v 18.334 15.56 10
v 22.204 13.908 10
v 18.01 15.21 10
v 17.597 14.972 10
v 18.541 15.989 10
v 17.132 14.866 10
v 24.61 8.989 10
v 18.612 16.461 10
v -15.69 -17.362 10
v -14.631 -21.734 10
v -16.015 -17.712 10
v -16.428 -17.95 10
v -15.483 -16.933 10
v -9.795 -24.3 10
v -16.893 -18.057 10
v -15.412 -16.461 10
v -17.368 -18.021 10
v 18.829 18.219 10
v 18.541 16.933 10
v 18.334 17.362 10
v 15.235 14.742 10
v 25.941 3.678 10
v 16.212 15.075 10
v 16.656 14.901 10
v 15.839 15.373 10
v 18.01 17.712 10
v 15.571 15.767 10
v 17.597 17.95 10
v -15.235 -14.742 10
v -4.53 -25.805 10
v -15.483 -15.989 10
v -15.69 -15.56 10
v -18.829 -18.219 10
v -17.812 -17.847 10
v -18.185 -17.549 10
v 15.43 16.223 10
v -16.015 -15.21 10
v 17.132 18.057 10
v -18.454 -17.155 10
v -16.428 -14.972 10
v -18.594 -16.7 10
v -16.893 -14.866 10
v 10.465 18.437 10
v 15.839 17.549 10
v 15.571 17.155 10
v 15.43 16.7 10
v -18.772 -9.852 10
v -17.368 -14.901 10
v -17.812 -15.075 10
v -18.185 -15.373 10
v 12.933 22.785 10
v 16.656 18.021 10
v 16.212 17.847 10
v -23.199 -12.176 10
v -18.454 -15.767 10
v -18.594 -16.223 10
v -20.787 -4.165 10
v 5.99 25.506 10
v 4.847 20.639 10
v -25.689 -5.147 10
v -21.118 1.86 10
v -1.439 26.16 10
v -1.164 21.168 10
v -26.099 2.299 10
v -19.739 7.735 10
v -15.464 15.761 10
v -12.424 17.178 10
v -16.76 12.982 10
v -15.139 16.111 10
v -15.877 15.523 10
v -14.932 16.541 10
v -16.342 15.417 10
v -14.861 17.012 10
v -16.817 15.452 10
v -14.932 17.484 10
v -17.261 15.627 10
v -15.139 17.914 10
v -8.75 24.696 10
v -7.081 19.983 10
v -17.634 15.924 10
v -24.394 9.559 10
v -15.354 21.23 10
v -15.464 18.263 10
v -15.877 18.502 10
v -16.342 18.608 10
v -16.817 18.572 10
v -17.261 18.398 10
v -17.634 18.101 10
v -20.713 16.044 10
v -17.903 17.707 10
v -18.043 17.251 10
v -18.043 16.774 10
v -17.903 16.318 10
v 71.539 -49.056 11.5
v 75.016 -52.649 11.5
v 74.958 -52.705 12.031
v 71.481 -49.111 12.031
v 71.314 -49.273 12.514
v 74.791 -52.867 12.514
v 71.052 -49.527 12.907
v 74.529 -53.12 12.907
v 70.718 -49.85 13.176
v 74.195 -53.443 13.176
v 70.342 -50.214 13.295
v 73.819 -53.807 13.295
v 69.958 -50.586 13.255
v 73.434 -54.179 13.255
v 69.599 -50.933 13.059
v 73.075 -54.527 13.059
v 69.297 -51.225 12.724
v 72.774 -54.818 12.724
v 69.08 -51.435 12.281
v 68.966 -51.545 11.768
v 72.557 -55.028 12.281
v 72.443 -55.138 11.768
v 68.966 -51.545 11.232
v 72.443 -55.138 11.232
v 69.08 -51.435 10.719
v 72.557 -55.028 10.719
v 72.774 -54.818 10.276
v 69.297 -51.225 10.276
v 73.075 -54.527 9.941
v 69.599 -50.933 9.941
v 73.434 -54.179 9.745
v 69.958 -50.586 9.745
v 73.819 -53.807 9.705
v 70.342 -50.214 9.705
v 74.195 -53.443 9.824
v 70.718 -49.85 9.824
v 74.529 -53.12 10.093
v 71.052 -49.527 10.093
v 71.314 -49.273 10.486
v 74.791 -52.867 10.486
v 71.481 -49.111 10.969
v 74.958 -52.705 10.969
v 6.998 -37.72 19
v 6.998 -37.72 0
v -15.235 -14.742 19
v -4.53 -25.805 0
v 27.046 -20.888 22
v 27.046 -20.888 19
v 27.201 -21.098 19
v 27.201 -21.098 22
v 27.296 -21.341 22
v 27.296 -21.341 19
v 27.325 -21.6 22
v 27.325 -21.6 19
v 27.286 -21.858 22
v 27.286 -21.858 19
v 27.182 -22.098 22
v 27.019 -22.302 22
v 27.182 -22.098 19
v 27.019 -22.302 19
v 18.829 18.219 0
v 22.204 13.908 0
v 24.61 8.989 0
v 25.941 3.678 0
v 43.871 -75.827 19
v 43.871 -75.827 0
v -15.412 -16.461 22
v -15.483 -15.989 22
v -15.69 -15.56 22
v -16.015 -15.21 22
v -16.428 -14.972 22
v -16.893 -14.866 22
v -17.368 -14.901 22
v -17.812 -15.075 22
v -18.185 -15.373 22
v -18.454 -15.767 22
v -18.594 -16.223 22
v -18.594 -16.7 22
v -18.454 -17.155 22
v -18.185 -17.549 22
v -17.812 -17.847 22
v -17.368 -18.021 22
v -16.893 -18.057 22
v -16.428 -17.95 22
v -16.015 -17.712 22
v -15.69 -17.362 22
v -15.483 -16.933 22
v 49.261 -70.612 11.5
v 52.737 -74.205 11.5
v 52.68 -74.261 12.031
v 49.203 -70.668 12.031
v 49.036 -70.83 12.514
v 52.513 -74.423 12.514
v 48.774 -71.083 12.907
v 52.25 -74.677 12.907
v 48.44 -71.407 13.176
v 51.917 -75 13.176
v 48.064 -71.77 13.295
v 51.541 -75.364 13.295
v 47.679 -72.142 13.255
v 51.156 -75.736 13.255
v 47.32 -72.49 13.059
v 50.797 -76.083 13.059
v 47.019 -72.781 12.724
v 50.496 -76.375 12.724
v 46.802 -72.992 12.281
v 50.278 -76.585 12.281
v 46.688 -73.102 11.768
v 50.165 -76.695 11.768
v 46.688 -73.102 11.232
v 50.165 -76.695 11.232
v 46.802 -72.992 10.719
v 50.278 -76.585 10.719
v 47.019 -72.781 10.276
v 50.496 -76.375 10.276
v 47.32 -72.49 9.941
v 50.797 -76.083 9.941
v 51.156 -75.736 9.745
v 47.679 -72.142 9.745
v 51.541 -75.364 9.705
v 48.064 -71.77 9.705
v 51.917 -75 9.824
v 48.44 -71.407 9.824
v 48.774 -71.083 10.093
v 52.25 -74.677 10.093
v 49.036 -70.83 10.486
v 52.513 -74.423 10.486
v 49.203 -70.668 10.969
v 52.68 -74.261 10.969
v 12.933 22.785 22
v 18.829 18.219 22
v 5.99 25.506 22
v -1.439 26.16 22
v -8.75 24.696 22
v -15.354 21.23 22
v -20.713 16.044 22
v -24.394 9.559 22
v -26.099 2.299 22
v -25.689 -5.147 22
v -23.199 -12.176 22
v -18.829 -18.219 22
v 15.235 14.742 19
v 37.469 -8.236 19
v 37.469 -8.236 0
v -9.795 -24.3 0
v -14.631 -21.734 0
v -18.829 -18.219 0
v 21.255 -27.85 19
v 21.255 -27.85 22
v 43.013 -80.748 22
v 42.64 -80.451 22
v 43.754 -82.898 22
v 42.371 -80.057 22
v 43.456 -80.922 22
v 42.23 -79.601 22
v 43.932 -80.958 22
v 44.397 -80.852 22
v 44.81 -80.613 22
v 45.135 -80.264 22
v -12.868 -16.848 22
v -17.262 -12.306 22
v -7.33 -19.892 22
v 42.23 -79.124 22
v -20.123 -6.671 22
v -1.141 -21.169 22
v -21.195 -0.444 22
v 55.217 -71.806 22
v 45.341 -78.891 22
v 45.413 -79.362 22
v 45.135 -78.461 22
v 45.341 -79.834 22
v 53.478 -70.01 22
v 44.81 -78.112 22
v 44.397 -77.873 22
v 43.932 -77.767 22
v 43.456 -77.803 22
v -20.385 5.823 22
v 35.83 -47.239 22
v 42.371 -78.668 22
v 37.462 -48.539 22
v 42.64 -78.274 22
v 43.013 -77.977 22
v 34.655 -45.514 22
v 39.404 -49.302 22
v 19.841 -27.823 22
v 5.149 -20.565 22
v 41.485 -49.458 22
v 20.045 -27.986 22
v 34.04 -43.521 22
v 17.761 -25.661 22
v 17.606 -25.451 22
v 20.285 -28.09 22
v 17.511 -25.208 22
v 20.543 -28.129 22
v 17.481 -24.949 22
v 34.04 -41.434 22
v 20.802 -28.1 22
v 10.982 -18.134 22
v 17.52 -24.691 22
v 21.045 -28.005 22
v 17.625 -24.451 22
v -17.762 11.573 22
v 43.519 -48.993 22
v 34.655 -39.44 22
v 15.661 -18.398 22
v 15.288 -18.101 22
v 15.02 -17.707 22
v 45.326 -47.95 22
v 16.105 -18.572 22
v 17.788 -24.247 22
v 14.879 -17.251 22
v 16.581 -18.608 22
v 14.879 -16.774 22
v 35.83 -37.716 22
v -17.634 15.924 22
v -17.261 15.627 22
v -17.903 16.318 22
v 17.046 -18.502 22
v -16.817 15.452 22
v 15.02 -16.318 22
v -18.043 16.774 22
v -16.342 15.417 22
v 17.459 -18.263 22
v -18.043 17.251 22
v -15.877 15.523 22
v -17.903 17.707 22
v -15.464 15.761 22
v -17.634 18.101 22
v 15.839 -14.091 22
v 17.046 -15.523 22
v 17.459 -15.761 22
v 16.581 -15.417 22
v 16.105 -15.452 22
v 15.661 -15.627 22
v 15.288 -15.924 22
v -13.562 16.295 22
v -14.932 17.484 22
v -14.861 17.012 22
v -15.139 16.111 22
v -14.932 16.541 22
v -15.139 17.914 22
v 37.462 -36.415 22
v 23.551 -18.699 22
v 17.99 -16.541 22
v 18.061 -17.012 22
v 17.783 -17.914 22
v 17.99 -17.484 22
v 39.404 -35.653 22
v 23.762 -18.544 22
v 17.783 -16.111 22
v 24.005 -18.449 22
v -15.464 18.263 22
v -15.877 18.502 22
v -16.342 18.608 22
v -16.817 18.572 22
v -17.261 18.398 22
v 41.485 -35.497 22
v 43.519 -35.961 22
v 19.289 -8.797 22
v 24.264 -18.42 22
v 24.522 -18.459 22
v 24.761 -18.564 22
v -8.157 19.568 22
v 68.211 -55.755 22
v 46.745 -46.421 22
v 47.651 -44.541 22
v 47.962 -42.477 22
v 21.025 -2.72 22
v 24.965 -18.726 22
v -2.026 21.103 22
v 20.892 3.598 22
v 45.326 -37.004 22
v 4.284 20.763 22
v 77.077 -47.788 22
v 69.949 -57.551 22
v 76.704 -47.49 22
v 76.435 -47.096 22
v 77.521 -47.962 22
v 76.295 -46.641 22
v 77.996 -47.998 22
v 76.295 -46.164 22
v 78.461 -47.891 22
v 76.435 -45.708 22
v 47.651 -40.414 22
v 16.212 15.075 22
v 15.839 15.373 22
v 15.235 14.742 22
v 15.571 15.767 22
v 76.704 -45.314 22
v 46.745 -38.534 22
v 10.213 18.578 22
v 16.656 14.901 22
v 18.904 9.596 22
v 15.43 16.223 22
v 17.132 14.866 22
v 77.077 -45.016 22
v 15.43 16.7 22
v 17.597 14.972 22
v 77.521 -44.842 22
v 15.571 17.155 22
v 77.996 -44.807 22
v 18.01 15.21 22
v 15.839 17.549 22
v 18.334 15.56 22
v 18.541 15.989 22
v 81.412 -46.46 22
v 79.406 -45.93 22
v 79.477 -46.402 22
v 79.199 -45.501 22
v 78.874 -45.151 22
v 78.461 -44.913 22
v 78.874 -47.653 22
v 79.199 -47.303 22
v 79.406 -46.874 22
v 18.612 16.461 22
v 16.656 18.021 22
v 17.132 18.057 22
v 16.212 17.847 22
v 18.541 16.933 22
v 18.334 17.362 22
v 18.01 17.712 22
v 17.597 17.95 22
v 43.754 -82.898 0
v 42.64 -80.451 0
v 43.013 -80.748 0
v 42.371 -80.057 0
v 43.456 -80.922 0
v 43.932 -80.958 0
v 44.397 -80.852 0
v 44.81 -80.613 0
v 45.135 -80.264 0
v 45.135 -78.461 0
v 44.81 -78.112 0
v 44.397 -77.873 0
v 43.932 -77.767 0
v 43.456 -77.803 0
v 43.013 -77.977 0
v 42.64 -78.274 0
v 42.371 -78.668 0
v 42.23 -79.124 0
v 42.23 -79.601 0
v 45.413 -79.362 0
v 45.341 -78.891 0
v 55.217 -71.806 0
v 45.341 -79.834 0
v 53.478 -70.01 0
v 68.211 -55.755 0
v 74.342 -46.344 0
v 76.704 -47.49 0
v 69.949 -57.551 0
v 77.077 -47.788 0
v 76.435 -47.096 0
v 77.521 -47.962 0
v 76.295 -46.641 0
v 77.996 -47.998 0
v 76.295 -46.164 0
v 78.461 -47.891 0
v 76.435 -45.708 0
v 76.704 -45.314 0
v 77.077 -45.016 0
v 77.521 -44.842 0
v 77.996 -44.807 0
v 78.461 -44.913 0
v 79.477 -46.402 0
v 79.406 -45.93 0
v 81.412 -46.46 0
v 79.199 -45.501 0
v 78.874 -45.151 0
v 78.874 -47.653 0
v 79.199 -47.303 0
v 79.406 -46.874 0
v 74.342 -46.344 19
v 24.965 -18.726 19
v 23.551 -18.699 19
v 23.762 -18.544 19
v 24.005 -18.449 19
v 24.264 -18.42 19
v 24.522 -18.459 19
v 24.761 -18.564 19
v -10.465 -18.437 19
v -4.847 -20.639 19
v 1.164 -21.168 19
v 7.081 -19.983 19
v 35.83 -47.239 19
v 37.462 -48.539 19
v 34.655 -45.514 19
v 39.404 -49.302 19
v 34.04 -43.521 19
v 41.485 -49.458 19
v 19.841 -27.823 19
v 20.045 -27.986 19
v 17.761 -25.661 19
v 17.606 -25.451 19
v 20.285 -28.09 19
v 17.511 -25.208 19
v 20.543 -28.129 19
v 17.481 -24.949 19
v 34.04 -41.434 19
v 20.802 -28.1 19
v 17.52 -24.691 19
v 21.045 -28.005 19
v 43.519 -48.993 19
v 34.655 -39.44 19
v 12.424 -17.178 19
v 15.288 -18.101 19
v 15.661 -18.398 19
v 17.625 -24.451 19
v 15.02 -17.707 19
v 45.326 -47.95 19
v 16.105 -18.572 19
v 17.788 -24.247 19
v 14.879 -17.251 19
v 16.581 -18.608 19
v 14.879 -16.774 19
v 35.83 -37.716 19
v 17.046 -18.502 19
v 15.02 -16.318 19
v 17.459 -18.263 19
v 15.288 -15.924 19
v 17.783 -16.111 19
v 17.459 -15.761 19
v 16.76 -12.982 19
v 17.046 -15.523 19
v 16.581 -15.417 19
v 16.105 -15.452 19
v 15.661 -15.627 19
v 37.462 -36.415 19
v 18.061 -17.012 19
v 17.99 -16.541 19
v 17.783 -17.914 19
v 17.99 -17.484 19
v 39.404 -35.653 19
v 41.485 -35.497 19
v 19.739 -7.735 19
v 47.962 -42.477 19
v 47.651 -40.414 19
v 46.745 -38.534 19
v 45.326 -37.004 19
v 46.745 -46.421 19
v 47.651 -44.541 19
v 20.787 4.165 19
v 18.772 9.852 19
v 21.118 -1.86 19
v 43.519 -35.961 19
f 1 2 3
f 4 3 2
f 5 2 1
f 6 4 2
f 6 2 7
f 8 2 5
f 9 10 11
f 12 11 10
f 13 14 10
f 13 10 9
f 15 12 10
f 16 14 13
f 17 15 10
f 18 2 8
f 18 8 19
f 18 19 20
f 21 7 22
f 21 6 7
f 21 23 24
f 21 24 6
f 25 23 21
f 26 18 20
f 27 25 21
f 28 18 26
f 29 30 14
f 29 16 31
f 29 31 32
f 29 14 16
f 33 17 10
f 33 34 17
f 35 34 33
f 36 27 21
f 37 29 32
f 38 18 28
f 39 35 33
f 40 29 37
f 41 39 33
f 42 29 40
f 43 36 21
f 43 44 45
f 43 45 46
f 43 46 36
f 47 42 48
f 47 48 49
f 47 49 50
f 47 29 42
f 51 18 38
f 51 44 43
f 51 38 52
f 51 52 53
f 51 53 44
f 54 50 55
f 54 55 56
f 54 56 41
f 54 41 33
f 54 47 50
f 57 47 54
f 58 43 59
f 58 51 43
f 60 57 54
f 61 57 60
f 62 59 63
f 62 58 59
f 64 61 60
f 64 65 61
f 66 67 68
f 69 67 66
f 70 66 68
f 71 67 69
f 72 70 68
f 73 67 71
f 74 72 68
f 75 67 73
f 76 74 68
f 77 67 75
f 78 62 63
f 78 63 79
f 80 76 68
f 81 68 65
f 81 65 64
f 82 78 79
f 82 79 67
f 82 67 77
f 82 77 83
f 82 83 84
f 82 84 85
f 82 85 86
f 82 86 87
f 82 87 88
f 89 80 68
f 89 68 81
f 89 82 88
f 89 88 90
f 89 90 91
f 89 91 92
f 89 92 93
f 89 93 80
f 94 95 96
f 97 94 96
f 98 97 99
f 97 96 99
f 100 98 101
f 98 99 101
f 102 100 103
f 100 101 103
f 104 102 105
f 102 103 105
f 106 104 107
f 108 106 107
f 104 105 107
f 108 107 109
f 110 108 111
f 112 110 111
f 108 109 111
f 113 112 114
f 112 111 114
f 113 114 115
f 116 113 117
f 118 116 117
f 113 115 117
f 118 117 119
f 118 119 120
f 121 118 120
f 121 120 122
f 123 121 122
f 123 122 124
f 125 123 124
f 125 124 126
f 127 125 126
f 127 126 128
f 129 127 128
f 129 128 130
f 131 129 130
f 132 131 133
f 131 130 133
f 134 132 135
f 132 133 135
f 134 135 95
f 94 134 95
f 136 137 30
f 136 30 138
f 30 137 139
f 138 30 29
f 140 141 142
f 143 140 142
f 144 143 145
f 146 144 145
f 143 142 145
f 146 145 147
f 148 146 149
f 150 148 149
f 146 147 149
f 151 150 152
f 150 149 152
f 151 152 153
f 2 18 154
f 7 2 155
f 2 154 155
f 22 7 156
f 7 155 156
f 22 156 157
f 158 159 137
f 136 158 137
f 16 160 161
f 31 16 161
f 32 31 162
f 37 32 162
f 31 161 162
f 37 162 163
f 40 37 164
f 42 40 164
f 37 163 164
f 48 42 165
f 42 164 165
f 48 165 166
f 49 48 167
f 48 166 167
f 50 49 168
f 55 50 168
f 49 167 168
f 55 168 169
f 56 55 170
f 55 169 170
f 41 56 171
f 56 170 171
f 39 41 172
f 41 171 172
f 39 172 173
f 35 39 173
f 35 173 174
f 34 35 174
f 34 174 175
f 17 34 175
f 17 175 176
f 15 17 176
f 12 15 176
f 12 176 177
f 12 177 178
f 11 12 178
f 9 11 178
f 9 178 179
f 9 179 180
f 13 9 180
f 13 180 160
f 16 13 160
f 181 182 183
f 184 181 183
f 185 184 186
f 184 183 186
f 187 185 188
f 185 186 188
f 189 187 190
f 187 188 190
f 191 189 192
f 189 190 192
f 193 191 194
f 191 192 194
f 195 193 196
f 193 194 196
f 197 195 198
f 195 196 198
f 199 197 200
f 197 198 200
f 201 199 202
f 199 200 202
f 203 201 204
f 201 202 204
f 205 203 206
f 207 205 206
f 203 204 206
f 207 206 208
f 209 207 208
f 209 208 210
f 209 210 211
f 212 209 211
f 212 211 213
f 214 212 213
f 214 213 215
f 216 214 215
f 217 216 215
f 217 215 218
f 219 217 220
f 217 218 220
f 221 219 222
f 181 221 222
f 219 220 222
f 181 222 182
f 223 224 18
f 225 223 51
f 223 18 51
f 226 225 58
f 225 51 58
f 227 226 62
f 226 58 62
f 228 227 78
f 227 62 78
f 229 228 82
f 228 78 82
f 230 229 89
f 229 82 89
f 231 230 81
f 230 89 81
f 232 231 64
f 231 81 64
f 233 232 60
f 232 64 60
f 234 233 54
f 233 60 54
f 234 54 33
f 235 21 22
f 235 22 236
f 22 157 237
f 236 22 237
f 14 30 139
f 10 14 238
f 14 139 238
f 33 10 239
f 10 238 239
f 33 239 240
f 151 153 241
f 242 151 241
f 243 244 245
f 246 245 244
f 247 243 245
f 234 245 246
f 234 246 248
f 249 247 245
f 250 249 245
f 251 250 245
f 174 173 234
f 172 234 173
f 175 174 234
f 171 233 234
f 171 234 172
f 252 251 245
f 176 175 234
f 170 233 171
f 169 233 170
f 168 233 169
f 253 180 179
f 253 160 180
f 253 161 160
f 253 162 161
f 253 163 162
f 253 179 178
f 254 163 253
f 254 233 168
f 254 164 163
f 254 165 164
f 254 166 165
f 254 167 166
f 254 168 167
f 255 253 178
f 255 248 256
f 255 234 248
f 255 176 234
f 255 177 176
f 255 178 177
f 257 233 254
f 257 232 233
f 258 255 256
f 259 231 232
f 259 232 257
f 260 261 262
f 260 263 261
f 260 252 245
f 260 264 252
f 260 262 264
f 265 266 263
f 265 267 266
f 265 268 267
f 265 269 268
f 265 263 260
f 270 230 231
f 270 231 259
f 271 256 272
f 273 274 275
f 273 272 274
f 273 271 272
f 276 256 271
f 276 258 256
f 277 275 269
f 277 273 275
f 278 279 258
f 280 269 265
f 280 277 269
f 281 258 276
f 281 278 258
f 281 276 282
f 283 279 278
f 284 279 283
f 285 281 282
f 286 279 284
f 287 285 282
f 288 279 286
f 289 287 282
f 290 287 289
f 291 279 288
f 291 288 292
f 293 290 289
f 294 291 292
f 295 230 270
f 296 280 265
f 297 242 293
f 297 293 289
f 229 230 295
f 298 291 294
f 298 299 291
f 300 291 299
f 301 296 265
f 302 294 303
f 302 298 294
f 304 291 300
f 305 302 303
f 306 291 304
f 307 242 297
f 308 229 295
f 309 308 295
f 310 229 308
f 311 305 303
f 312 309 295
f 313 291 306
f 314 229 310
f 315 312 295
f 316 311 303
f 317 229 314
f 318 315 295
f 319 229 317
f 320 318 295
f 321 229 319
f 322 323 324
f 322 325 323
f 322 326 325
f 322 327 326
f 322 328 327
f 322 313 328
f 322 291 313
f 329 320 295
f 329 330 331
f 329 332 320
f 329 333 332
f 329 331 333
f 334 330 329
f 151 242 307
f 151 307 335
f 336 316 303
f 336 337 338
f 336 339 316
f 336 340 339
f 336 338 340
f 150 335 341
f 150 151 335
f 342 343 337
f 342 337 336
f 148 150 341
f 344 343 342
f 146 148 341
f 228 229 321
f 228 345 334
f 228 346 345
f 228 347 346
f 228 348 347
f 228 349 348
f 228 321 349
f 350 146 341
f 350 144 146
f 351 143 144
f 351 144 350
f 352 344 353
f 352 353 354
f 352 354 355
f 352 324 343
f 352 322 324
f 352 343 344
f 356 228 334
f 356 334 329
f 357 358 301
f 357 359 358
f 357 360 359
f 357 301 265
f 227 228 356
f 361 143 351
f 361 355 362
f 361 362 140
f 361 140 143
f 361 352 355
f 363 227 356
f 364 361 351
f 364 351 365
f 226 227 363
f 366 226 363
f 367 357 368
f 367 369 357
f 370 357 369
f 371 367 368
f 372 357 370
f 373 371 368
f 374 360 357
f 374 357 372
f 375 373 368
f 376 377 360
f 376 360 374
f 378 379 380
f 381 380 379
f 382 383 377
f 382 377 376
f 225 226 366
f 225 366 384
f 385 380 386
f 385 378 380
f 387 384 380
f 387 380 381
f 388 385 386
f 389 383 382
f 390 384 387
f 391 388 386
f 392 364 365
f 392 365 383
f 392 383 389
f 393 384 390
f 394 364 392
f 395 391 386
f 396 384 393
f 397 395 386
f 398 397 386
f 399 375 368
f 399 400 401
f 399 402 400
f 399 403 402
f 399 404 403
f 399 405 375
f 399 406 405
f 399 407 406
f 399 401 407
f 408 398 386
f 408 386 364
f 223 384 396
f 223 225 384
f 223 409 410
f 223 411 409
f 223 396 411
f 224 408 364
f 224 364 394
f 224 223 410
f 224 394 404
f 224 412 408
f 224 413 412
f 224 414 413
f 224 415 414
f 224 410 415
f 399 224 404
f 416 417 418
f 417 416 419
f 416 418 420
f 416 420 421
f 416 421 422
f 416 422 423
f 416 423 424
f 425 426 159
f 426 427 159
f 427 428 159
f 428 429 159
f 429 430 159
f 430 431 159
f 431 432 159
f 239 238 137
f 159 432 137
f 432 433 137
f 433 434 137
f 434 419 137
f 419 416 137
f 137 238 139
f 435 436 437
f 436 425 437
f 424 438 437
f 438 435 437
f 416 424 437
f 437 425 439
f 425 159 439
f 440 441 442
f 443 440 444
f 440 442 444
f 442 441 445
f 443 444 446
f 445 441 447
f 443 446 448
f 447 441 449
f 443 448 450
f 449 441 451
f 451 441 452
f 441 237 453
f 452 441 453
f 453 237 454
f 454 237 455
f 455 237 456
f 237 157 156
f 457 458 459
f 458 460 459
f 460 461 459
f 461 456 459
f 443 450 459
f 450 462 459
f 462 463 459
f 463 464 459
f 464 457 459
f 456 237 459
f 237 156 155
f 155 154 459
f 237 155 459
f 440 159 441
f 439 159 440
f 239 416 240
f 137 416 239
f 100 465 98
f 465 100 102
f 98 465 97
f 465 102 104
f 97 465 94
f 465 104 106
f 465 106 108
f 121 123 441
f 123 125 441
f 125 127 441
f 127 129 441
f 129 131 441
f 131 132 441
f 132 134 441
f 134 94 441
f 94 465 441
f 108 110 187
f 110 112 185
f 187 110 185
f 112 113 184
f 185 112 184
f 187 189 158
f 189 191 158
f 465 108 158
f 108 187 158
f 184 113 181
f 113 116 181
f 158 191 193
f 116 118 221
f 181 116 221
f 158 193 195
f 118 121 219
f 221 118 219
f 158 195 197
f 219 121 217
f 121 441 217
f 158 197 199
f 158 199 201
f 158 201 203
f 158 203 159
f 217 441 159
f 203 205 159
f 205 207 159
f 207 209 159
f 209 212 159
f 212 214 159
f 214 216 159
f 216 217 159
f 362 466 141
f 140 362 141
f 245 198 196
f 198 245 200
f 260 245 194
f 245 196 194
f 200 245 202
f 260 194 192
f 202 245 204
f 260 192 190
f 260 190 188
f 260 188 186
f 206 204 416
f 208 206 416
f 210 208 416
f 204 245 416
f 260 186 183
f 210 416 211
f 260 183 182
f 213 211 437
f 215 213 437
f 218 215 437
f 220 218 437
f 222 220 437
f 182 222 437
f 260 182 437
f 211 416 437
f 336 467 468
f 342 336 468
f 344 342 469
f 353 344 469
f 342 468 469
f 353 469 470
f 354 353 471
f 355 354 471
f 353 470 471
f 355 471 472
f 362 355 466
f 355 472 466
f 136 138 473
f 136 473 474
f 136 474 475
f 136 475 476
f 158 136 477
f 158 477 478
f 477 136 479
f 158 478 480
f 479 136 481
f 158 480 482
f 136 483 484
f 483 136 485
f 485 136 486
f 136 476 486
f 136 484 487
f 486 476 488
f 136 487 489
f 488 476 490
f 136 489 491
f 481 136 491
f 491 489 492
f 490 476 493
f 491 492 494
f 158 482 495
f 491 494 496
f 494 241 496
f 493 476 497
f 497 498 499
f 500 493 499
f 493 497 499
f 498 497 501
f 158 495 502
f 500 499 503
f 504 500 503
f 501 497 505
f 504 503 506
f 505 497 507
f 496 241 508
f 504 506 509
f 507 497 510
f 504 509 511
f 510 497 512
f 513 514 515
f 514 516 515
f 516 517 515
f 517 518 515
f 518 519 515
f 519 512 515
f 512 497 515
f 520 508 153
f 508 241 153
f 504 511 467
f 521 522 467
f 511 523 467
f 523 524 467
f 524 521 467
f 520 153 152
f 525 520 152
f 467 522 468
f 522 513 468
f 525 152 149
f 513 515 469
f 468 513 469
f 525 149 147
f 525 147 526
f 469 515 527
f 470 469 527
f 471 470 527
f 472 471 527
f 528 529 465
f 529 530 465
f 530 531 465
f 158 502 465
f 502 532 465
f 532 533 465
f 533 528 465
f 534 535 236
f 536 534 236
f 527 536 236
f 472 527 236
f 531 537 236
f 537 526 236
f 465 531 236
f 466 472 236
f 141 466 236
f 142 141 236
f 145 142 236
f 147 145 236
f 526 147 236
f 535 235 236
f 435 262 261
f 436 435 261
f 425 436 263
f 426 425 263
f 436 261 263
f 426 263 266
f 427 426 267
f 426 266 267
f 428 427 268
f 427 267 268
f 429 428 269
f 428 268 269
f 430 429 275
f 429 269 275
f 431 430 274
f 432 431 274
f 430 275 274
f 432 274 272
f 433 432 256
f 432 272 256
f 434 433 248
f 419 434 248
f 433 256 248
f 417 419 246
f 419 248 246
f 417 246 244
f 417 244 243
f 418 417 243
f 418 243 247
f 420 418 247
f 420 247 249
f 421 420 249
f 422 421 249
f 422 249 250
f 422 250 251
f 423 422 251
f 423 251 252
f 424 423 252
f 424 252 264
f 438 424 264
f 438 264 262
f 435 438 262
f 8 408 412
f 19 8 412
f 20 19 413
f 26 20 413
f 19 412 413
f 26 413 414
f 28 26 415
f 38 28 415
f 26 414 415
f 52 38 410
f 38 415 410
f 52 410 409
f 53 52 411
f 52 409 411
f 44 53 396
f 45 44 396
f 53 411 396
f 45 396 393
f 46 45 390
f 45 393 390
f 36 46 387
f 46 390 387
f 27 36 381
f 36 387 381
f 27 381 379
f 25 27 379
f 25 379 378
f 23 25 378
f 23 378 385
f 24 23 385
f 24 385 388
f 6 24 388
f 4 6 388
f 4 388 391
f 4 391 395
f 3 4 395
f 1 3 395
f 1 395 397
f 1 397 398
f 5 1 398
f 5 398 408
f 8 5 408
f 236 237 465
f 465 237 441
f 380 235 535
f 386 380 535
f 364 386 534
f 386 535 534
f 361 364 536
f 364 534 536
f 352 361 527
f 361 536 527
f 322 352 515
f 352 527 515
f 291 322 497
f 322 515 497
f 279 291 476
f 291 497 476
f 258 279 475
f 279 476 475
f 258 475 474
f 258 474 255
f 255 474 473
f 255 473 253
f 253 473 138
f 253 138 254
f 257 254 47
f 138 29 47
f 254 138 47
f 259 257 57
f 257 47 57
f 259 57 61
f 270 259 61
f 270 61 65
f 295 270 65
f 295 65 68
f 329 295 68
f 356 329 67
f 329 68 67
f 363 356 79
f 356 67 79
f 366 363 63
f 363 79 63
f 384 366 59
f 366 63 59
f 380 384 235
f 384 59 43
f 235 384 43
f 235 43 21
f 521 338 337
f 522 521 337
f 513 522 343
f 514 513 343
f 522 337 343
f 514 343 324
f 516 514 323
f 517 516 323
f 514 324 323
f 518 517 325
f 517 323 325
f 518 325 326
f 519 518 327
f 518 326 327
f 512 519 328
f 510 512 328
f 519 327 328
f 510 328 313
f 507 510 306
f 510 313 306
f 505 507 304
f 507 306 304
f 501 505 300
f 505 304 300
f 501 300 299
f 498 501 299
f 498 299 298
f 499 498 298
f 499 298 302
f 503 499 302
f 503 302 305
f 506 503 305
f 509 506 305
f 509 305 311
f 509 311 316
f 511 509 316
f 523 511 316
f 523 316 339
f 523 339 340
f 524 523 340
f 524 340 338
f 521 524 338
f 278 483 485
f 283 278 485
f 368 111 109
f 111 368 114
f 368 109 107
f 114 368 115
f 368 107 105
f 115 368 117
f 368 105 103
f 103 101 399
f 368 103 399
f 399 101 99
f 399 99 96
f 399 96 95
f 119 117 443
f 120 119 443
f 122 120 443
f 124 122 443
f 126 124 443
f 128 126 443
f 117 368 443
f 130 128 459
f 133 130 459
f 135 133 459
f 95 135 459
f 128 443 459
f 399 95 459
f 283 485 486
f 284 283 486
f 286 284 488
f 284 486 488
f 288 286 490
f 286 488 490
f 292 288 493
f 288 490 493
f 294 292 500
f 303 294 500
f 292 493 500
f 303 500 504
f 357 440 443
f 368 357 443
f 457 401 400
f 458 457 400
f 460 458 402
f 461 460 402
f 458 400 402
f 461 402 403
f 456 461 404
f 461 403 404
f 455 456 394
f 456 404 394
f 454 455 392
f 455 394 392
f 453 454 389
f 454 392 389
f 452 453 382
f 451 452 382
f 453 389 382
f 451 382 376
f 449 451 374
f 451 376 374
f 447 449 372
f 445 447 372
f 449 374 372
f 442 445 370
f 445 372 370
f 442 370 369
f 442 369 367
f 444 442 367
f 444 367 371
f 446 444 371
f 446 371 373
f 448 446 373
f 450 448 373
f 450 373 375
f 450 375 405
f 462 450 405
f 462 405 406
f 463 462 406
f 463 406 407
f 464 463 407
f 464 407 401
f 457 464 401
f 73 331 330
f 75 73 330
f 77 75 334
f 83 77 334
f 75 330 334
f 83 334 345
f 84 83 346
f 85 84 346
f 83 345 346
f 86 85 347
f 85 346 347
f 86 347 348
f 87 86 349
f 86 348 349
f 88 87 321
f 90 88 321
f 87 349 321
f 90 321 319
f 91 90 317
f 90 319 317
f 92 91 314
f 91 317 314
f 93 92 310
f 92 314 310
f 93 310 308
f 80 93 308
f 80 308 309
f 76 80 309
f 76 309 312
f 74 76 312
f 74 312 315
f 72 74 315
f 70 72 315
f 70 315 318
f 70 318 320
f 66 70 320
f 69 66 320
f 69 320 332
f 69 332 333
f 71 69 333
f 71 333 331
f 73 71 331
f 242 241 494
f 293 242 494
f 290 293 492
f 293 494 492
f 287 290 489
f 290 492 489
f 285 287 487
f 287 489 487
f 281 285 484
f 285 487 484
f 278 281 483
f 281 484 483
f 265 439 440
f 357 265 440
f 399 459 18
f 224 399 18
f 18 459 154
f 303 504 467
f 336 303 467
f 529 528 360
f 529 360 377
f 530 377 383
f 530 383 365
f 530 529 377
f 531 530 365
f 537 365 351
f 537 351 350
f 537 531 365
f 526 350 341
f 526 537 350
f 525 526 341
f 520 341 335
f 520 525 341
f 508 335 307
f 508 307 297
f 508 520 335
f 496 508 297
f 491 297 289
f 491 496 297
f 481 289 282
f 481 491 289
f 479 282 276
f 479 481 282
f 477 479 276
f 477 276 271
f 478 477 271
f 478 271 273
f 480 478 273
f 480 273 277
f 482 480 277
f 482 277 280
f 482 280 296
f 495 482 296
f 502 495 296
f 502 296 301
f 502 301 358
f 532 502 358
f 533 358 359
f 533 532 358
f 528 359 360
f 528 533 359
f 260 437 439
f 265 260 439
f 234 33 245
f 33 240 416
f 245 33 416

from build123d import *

# Parameters (mm, degrees)
BOSS_EXTRUDE1_DEPTH = 22
SKETCH3_R           = 26.2
CUT_EXTRUDE1_DEPTH  = 10
BOSS_EXTRUDE2_START = -3
SKETCH4_R           = 7
BOSS_EXTRUDE2_DEPTH = 3
SKETCH5_R           = 1.8
CUT_EXTRUDE2_DEPTH  = 5
SKETCH6_R           = 1.6
CUT_EXTRUDE3_DEPTH  = 119.253467405
SKETCH7_R           = 1.6
CUT_EXTRUDE4_DEPTH  = 119.253467405


with BuildPart() as part:
    # Sketch2 → Boss-Extrude1 (new body)
    with BuildSketch(Plane.XY):
        with BuildLine():
            Line((81.411807591, -46.460279646), (18.828747548, 18.218624146))
            ThreePointArc((18.828747548, 18.218624146), (-18.218624146, 18.828747548), (-18.828747548, -18.218624146))
            Line((-18.828747548, -18.218624146), (43.754312495, -82.897527937))
            Line((43.754312495, -82.897527937), (55.216851555, -71.806418963))
            Line((55.216851555, -71.806418963), (53.478433221, -70.009782747))
            Line((53.478433221, -70.009782747), (68.210850196, -55.754752404))
            Line((68.210850196, -55.754752404), (69.94926853, -57.55138862))
            Line((69.94926853, -57.55138862), (81.411807591, -46.460279646))
        make_face()
        with BuildLine():
            Line((37.468734256, -8.236041156), (74.341698489, -46.343843882))
            Line((74.341698489, -46.343843882), (43.870748258, -75.827418835))
            Line((43.870748258, -75.827418835), (6.997784026, -37.719616109))
            Line((6.997784026, -37.719616109), (-15.235475115, -14.741787477))
            ThreePointArc((-15.235475115, -14.741787477), (-14.741787477, 15.235475115), (15.235475115, 14.741787477))
            Line((15.235475115, 14.741787477), (37.468734256, -8.236041156))
        make_face(mode=Mode.SUBTRACT)
    extrude(amount=BOSS_EXTRUDE1_DEPTH)

    # Sketch3 → Cut-Extrude1 (cut)
    with BuildSketch(Plane(origin=(0, 0, 0), x_dir=(-1, 0, 0), z_dir=(0, 0, -1))):
        Circle(SKETCH3_R)
    extrude(amount=-CUT_EXTRUDE1_DEPTH, mode=Mode.SUBTRACT)

    # Sketch4 → Boss-Extrude2 (add)
    with BuildSketch(Plane.XY.offset(22).offset(BOSS_EXTRUDE2_START)):
        with BuildLine():
            Line((43.870748258, -75.827418835), (74.341698489, -46.343843882))
            Line((74.341698489, -46.343843882), (15.235475115, 14.741787477))
            ThreePointArc((15.235475115, 14.741787477), (14.741787477, -15.235475115), (-15.235475115, -14.741787477))
            Line((-15.235475115, -14.741787477), (43.870748258, -75.827418835))
        make_face()
        with Locations((40.961727216, -42.477303154)):
            Circle(SKETCH4_R, mode=Mode.SUBTRACT)
        with BuildLine():
            Line((24.96542229, -18.72640467), (27.045904207, -20.887791955))
            ThreePointArc((27.045904207, -20.887791955), (27.325259938, -21.600355505), (27.018935751, -22.301748355))
            Line((27.018935751, -22.301748355), (21.255236326, -27.849700134))
            ThreePointArc((21.255236326, -27.849700134), (20.542672775, -28.129055865), (19.841279925, -27.822731678))
            Line((19.841279925, -27.822731678), (17.760798008, -25.661344393))
            ThreePointArc((17.760798008, -25.661344393), (17.481442277, -24.948780843), (17.787766464, -24.247387993))
            Line((17.787766464, -24.247387993), (23.551465889, -18.699436214))
            ThreePointArc((23.551465889, -18.699436214), (24.264029439, -18.420080483), (24.96542229, -18.72640467))
        make_face(mode=Mode.SUBTRACT)
    extrude(amount=BOSS_EXTRUDE2_DEPTH)

    # Sketch5 → Cut-Extrude2 (cut)
    with BuildSketch(Plane(origin=(62.583060043, -64.678903792, 0), x_dir=(0.7186544865731441, 0.6953673338087509, 0), z_dir=(0.6953673338087509, -0.7186544865731441, 0))):
        with Locations((15.5, 11.5)):
            Circle(SKETCH5_R)
        with Locations((-15.5, 11.5)):
            Circle(SKETCH5_R)
    extrude(amount=-CUT_EXTRUDE2_DEPTH, mode=Mode.SUBTRACT)

    # Sketch6 → Cut-Extrude3 (cut, through all)
    with BuildSketch(Plane.XY.offset(22)):
        with Locations((77.87675304, -46.402061764)):
            Circle(SKETCH6_R)
        with Locations((43.812530376, -79.362473386)):
            Circle(SKETCH6_R)
    extrude(amount=-CUT_EXTRUDE3_DEPTH, mode=Mode.SUBTRACT)

    # Sketch7 → Cut-Extrude4 (cut, through all)
    with BuildSketch(Plane.XY.offset(22)):
        with Locations((-16.461094787, 17.012360299)):
            Circle(SKETCH7_R)
        with Locations((17.012360299, 16.461094787)):
            Circle(SKETCH7_R)
        with Locations((16.461094787, -17.012360299)):
            Circle(SKETCH7_R)
        with Locations((-17.012360299, -16.461094787)):
            Circle(SKETCH7_R)
    extrude(amount=-CUT_EXTRUDE4_DEPTH, mode=Mode.SUBTRACT)


solid = part.part
